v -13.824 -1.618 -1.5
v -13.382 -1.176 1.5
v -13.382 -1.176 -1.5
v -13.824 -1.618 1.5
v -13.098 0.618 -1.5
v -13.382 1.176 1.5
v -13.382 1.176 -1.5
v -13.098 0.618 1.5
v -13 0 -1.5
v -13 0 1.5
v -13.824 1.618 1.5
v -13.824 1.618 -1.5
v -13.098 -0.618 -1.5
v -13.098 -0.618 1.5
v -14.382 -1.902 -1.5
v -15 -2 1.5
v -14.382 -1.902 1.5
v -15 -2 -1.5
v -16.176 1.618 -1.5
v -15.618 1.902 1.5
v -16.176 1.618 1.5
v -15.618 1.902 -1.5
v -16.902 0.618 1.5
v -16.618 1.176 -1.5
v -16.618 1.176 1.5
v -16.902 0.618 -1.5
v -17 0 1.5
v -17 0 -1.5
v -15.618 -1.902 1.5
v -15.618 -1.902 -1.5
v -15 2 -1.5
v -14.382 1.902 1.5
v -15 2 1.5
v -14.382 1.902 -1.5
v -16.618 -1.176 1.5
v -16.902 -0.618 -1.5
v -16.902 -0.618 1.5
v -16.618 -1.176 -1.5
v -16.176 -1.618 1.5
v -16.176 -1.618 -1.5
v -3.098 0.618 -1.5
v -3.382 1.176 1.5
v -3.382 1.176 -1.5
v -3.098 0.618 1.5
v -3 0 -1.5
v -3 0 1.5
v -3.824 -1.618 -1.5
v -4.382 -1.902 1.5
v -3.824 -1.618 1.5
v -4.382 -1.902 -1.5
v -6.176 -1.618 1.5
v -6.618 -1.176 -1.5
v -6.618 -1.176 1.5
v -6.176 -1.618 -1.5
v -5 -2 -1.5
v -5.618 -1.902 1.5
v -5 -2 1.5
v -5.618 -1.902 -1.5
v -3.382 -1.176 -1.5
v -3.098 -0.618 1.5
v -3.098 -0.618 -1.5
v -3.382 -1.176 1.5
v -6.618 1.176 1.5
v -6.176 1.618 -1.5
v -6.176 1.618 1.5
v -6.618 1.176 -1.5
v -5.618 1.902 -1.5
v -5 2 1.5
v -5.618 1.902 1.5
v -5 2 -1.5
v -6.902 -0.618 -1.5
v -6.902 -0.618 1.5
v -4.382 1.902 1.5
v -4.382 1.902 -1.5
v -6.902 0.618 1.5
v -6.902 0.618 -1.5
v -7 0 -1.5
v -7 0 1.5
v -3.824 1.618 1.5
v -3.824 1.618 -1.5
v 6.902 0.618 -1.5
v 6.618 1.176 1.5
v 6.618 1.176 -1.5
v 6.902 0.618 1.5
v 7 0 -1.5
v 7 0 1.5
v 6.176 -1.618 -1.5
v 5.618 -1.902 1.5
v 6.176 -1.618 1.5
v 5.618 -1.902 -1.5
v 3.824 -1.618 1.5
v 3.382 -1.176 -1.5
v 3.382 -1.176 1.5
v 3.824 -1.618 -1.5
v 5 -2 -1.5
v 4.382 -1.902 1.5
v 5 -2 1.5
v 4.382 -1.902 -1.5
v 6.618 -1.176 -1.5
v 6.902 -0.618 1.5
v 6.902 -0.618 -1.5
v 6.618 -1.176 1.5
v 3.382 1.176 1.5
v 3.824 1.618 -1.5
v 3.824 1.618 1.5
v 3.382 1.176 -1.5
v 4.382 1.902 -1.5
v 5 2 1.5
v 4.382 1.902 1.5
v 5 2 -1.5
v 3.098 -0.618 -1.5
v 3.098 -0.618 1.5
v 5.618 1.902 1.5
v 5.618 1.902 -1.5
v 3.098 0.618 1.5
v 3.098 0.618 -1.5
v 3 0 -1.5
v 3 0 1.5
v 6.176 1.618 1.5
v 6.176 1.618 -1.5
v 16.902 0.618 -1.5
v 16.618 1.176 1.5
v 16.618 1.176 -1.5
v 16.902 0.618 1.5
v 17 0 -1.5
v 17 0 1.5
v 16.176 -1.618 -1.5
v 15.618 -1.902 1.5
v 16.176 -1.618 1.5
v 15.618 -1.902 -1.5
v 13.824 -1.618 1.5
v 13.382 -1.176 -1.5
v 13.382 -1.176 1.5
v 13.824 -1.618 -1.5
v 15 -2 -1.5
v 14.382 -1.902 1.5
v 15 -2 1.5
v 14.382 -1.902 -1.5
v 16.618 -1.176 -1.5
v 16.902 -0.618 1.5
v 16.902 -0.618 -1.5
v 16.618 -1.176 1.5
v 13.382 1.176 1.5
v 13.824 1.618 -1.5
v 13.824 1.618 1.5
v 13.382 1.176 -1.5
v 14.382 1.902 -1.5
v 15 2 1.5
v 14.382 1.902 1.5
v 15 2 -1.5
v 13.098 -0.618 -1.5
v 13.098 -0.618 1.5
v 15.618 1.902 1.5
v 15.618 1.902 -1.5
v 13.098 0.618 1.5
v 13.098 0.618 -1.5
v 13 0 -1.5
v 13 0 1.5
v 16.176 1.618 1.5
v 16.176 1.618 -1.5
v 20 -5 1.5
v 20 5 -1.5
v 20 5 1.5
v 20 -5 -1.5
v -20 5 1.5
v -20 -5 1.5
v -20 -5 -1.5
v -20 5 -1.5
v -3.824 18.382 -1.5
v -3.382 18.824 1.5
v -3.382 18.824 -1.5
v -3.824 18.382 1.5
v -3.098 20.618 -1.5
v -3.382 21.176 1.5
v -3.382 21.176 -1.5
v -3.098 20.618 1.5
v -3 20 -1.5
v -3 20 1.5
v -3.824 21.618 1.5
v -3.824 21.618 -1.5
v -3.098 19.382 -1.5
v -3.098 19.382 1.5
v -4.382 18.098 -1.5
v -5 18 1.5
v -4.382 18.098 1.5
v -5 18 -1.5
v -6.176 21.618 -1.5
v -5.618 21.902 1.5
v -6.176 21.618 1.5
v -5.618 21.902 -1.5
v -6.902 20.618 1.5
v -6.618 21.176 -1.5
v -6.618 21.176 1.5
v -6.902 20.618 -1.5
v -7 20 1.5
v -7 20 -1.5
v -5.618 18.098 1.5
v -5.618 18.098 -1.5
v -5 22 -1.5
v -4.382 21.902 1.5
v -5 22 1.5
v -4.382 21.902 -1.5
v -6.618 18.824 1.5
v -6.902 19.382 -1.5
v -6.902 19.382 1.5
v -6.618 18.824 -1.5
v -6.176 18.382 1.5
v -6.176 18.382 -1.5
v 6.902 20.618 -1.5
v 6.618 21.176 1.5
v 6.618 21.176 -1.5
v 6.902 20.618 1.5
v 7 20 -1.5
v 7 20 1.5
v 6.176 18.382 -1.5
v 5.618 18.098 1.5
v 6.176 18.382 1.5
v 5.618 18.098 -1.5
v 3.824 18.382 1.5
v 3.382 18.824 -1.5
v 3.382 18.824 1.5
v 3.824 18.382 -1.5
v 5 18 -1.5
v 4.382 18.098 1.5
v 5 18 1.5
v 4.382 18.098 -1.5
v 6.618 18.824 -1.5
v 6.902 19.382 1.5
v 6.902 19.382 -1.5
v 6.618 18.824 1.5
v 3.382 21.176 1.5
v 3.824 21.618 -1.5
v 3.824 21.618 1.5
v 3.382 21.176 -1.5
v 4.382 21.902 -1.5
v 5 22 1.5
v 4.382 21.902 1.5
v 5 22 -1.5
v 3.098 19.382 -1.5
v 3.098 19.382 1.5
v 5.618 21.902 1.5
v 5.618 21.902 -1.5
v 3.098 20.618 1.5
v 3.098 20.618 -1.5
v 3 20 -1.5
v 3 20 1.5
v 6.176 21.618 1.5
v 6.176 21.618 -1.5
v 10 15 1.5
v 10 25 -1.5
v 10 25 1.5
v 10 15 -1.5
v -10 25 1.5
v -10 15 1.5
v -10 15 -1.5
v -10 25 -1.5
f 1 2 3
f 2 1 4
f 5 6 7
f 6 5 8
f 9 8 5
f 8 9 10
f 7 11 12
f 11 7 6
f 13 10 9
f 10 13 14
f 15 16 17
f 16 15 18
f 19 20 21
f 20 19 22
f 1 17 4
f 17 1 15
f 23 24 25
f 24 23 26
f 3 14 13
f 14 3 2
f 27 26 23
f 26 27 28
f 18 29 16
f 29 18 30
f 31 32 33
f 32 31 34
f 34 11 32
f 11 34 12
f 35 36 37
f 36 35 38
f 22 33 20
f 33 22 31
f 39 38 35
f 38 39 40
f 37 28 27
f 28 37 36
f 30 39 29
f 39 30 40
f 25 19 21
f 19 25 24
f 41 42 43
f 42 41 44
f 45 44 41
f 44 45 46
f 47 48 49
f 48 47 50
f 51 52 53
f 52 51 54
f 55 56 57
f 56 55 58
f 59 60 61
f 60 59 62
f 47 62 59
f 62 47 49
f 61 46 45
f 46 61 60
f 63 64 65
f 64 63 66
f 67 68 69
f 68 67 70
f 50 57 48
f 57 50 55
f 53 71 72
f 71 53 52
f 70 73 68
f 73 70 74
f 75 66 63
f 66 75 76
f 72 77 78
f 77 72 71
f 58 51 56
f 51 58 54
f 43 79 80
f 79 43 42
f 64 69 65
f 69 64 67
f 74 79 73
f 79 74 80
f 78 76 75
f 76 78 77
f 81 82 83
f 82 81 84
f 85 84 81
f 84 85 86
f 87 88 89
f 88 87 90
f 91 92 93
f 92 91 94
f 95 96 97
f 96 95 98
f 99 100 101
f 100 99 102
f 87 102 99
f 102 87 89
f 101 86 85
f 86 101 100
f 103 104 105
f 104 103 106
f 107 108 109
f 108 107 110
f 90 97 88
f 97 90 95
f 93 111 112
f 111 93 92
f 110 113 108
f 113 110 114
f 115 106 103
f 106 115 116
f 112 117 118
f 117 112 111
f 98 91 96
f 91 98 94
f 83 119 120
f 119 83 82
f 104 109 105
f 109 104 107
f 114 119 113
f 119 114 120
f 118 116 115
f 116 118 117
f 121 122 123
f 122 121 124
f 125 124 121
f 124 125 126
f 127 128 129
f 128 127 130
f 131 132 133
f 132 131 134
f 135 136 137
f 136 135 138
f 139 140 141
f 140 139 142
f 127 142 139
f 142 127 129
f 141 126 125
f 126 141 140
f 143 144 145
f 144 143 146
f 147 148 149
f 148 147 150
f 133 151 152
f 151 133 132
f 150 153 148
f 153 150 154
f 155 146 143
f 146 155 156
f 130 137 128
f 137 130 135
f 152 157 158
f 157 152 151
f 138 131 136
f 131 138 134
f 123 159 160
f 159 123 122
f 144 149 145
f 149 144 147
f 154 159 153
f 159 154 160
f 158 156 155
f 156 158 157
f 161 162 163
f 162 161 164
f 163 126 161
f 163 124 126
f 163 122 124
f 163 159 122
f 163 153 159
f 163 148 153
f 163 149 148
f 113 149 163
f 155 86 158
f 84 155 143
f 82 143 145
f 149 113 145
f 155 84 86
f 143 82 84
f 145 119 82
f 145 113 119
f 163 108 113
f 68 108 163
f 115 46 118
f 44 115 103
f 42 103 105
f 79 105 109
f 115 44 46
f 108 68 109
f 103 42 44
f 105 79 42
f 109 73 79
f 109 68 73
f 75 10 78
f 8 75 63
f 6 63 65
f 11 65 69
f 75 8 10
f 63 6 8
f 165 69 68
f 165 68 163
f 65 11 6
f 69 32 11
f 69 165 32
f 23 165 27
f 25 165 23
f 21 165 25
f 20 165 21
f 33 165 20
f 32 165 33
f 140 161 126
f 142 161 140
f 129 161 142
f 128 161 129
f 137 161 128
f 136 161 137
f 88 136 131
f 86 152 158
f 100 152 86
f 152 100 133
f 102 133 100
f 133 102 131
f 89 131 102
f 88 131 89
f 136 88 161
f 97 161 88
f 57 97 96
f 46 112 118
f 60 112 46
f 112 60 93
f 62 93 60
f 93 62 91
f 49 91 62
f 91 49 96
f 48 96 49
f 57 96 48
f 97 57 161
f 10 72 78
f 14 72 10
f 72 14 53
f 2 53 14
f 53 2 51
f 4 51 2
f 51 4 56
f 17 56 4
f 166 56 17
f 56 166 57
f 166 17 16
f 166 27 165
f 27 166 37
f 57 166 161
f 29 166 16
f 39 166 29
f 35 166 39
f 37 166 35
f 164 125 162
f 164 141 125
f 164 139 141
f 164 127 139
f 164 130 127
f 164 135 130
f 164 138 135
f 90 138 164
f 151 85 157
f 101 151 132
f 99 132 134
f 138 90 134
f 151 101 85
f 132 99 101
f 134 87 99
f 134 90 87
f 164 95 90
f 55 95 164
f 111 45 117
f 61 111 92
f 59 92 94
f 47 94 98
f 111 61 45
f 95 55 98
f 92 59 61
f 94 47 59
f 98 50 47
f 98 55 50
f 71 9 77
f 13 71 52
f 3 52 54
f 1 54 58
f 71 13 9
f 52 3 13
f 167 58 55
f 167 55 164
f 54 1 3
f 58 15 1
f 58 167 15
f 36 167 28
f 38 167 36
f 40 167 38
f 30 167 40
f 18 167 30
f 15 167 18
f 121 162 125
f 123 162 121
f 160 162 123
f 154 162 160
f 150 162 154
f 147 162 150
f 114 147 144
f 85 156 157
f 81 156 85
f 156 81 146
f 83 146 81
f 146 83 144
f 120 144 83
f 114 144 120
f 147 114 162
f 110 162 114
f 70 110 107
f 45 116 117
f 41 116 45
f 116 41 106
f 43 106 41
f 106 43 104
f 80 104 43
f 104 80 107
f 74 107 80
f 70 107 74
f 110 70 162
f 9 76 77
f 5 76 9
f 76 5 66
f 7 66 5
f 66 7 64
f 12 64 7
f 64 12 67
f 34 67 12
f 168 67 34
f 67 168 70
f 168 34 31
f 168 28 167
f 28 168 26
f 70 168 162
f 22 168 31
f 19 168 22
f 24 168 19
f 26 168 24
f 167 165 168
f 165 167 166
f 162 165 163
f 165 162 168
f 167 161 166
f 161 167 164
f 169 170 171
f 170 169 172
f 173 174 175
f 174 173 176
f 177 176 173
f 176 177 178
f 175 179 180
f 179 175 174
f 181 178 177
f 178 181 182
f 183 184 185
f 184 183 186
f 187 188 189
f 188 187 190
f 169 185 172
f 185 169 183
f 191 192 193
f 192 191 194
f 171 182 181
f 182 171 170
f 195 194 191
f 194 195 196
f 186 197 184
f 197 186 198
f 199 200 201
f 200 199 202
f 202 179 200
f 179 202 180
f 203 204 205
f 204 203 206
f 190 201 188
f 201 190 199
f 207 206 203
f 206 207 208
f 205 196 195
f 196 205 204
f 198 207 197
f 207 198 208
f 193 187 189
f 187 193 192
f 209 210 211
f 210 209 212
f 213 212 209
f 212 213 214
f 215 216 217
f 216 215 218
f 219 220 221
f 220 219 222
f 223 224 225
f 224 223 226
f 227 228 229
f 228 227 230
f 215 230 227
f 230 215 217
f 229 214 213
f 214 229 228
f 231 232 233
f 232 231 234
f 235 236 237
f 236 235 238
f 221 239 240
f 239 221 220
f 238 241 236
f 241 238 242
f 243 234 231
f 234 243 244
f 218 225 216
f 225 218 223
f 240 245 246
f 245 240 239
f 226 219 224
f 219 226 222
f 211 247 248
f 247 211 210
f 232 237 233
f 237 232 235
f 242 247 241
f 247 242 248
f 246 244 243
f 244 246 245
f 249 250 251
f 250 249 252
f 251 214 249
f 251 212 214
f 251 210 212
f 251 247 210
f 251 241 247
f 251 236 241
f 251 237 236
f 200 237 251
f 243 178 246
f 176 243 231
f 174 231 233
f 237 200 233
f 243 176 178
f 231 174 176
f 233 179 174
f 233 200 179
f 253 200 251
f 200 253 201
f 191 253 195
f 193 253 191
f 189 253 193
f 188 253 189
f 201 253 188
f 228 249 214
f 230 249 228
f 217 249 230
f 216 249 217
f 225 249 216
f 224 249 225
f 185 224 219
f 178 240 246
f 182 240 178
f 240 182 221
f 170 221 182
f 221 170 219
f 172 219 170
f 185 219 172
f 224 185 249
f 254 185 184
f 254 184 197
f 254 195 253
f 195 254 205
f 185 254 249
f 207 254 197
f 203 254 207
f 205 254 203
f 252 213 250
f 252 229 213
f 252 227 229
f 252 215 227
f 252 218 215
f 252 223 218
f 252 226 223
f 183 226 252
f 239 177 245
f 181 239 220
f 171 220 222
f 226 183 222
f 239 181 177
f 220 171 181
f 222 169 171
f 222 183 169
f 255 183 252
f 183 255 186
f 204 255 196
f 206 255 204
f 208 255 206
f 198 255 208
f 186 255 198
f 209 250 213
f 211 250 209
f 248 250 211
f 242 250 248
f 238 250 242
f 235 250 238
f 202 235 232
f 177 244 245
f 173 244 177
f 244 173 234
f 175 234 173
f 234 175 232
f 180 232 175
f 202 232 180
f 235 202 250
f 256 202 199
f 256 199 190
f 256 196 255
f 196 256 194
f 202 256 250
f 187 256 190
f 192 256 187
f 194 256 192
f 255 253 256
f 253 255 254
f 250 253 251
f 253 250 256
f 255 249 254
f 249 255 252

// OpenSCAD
//----------------------------------------------------------
//-- Tutorial OpenScad
//-- Juan Gonzalez-Gomez (Obijuan) juan@iearobotics.com
//----------------------------------------------------------
//-- (c) Mayo, 2012
//-- Licencia GPL
//----------------------------------------------------------
//-- Ejemplo 1: Pieza de mecano
//-- Pieza basica de mecano, parametrizada, en un modulo
//-- y con parmaetros por defecto
//----------------------------------------------------------

module pieza_mecano(n=4, drill=4, d=10, anchura=10, grosor=3)
{
  //-- Calcular al longitud de la pieza
  lx = n*d;

  //-- Construir la pieza
  difference() {
    //-- Cuerpo de la pieza
    cube([lx,anchura,grosor],center=true);

    //-- Taladros
    translate([-lx/2+d/2,0,0])
      for (i=[0:n-1]) {
        translate([i*d,0,0])
          cylinder(r=drill/2, h=grosor+5, $fn=20,center=true);
     }
  }
}

//-- Ejemplos de utilizacion
pieza_mecano();

translate([0,20,0])
  pieza_mecano(n=2);
